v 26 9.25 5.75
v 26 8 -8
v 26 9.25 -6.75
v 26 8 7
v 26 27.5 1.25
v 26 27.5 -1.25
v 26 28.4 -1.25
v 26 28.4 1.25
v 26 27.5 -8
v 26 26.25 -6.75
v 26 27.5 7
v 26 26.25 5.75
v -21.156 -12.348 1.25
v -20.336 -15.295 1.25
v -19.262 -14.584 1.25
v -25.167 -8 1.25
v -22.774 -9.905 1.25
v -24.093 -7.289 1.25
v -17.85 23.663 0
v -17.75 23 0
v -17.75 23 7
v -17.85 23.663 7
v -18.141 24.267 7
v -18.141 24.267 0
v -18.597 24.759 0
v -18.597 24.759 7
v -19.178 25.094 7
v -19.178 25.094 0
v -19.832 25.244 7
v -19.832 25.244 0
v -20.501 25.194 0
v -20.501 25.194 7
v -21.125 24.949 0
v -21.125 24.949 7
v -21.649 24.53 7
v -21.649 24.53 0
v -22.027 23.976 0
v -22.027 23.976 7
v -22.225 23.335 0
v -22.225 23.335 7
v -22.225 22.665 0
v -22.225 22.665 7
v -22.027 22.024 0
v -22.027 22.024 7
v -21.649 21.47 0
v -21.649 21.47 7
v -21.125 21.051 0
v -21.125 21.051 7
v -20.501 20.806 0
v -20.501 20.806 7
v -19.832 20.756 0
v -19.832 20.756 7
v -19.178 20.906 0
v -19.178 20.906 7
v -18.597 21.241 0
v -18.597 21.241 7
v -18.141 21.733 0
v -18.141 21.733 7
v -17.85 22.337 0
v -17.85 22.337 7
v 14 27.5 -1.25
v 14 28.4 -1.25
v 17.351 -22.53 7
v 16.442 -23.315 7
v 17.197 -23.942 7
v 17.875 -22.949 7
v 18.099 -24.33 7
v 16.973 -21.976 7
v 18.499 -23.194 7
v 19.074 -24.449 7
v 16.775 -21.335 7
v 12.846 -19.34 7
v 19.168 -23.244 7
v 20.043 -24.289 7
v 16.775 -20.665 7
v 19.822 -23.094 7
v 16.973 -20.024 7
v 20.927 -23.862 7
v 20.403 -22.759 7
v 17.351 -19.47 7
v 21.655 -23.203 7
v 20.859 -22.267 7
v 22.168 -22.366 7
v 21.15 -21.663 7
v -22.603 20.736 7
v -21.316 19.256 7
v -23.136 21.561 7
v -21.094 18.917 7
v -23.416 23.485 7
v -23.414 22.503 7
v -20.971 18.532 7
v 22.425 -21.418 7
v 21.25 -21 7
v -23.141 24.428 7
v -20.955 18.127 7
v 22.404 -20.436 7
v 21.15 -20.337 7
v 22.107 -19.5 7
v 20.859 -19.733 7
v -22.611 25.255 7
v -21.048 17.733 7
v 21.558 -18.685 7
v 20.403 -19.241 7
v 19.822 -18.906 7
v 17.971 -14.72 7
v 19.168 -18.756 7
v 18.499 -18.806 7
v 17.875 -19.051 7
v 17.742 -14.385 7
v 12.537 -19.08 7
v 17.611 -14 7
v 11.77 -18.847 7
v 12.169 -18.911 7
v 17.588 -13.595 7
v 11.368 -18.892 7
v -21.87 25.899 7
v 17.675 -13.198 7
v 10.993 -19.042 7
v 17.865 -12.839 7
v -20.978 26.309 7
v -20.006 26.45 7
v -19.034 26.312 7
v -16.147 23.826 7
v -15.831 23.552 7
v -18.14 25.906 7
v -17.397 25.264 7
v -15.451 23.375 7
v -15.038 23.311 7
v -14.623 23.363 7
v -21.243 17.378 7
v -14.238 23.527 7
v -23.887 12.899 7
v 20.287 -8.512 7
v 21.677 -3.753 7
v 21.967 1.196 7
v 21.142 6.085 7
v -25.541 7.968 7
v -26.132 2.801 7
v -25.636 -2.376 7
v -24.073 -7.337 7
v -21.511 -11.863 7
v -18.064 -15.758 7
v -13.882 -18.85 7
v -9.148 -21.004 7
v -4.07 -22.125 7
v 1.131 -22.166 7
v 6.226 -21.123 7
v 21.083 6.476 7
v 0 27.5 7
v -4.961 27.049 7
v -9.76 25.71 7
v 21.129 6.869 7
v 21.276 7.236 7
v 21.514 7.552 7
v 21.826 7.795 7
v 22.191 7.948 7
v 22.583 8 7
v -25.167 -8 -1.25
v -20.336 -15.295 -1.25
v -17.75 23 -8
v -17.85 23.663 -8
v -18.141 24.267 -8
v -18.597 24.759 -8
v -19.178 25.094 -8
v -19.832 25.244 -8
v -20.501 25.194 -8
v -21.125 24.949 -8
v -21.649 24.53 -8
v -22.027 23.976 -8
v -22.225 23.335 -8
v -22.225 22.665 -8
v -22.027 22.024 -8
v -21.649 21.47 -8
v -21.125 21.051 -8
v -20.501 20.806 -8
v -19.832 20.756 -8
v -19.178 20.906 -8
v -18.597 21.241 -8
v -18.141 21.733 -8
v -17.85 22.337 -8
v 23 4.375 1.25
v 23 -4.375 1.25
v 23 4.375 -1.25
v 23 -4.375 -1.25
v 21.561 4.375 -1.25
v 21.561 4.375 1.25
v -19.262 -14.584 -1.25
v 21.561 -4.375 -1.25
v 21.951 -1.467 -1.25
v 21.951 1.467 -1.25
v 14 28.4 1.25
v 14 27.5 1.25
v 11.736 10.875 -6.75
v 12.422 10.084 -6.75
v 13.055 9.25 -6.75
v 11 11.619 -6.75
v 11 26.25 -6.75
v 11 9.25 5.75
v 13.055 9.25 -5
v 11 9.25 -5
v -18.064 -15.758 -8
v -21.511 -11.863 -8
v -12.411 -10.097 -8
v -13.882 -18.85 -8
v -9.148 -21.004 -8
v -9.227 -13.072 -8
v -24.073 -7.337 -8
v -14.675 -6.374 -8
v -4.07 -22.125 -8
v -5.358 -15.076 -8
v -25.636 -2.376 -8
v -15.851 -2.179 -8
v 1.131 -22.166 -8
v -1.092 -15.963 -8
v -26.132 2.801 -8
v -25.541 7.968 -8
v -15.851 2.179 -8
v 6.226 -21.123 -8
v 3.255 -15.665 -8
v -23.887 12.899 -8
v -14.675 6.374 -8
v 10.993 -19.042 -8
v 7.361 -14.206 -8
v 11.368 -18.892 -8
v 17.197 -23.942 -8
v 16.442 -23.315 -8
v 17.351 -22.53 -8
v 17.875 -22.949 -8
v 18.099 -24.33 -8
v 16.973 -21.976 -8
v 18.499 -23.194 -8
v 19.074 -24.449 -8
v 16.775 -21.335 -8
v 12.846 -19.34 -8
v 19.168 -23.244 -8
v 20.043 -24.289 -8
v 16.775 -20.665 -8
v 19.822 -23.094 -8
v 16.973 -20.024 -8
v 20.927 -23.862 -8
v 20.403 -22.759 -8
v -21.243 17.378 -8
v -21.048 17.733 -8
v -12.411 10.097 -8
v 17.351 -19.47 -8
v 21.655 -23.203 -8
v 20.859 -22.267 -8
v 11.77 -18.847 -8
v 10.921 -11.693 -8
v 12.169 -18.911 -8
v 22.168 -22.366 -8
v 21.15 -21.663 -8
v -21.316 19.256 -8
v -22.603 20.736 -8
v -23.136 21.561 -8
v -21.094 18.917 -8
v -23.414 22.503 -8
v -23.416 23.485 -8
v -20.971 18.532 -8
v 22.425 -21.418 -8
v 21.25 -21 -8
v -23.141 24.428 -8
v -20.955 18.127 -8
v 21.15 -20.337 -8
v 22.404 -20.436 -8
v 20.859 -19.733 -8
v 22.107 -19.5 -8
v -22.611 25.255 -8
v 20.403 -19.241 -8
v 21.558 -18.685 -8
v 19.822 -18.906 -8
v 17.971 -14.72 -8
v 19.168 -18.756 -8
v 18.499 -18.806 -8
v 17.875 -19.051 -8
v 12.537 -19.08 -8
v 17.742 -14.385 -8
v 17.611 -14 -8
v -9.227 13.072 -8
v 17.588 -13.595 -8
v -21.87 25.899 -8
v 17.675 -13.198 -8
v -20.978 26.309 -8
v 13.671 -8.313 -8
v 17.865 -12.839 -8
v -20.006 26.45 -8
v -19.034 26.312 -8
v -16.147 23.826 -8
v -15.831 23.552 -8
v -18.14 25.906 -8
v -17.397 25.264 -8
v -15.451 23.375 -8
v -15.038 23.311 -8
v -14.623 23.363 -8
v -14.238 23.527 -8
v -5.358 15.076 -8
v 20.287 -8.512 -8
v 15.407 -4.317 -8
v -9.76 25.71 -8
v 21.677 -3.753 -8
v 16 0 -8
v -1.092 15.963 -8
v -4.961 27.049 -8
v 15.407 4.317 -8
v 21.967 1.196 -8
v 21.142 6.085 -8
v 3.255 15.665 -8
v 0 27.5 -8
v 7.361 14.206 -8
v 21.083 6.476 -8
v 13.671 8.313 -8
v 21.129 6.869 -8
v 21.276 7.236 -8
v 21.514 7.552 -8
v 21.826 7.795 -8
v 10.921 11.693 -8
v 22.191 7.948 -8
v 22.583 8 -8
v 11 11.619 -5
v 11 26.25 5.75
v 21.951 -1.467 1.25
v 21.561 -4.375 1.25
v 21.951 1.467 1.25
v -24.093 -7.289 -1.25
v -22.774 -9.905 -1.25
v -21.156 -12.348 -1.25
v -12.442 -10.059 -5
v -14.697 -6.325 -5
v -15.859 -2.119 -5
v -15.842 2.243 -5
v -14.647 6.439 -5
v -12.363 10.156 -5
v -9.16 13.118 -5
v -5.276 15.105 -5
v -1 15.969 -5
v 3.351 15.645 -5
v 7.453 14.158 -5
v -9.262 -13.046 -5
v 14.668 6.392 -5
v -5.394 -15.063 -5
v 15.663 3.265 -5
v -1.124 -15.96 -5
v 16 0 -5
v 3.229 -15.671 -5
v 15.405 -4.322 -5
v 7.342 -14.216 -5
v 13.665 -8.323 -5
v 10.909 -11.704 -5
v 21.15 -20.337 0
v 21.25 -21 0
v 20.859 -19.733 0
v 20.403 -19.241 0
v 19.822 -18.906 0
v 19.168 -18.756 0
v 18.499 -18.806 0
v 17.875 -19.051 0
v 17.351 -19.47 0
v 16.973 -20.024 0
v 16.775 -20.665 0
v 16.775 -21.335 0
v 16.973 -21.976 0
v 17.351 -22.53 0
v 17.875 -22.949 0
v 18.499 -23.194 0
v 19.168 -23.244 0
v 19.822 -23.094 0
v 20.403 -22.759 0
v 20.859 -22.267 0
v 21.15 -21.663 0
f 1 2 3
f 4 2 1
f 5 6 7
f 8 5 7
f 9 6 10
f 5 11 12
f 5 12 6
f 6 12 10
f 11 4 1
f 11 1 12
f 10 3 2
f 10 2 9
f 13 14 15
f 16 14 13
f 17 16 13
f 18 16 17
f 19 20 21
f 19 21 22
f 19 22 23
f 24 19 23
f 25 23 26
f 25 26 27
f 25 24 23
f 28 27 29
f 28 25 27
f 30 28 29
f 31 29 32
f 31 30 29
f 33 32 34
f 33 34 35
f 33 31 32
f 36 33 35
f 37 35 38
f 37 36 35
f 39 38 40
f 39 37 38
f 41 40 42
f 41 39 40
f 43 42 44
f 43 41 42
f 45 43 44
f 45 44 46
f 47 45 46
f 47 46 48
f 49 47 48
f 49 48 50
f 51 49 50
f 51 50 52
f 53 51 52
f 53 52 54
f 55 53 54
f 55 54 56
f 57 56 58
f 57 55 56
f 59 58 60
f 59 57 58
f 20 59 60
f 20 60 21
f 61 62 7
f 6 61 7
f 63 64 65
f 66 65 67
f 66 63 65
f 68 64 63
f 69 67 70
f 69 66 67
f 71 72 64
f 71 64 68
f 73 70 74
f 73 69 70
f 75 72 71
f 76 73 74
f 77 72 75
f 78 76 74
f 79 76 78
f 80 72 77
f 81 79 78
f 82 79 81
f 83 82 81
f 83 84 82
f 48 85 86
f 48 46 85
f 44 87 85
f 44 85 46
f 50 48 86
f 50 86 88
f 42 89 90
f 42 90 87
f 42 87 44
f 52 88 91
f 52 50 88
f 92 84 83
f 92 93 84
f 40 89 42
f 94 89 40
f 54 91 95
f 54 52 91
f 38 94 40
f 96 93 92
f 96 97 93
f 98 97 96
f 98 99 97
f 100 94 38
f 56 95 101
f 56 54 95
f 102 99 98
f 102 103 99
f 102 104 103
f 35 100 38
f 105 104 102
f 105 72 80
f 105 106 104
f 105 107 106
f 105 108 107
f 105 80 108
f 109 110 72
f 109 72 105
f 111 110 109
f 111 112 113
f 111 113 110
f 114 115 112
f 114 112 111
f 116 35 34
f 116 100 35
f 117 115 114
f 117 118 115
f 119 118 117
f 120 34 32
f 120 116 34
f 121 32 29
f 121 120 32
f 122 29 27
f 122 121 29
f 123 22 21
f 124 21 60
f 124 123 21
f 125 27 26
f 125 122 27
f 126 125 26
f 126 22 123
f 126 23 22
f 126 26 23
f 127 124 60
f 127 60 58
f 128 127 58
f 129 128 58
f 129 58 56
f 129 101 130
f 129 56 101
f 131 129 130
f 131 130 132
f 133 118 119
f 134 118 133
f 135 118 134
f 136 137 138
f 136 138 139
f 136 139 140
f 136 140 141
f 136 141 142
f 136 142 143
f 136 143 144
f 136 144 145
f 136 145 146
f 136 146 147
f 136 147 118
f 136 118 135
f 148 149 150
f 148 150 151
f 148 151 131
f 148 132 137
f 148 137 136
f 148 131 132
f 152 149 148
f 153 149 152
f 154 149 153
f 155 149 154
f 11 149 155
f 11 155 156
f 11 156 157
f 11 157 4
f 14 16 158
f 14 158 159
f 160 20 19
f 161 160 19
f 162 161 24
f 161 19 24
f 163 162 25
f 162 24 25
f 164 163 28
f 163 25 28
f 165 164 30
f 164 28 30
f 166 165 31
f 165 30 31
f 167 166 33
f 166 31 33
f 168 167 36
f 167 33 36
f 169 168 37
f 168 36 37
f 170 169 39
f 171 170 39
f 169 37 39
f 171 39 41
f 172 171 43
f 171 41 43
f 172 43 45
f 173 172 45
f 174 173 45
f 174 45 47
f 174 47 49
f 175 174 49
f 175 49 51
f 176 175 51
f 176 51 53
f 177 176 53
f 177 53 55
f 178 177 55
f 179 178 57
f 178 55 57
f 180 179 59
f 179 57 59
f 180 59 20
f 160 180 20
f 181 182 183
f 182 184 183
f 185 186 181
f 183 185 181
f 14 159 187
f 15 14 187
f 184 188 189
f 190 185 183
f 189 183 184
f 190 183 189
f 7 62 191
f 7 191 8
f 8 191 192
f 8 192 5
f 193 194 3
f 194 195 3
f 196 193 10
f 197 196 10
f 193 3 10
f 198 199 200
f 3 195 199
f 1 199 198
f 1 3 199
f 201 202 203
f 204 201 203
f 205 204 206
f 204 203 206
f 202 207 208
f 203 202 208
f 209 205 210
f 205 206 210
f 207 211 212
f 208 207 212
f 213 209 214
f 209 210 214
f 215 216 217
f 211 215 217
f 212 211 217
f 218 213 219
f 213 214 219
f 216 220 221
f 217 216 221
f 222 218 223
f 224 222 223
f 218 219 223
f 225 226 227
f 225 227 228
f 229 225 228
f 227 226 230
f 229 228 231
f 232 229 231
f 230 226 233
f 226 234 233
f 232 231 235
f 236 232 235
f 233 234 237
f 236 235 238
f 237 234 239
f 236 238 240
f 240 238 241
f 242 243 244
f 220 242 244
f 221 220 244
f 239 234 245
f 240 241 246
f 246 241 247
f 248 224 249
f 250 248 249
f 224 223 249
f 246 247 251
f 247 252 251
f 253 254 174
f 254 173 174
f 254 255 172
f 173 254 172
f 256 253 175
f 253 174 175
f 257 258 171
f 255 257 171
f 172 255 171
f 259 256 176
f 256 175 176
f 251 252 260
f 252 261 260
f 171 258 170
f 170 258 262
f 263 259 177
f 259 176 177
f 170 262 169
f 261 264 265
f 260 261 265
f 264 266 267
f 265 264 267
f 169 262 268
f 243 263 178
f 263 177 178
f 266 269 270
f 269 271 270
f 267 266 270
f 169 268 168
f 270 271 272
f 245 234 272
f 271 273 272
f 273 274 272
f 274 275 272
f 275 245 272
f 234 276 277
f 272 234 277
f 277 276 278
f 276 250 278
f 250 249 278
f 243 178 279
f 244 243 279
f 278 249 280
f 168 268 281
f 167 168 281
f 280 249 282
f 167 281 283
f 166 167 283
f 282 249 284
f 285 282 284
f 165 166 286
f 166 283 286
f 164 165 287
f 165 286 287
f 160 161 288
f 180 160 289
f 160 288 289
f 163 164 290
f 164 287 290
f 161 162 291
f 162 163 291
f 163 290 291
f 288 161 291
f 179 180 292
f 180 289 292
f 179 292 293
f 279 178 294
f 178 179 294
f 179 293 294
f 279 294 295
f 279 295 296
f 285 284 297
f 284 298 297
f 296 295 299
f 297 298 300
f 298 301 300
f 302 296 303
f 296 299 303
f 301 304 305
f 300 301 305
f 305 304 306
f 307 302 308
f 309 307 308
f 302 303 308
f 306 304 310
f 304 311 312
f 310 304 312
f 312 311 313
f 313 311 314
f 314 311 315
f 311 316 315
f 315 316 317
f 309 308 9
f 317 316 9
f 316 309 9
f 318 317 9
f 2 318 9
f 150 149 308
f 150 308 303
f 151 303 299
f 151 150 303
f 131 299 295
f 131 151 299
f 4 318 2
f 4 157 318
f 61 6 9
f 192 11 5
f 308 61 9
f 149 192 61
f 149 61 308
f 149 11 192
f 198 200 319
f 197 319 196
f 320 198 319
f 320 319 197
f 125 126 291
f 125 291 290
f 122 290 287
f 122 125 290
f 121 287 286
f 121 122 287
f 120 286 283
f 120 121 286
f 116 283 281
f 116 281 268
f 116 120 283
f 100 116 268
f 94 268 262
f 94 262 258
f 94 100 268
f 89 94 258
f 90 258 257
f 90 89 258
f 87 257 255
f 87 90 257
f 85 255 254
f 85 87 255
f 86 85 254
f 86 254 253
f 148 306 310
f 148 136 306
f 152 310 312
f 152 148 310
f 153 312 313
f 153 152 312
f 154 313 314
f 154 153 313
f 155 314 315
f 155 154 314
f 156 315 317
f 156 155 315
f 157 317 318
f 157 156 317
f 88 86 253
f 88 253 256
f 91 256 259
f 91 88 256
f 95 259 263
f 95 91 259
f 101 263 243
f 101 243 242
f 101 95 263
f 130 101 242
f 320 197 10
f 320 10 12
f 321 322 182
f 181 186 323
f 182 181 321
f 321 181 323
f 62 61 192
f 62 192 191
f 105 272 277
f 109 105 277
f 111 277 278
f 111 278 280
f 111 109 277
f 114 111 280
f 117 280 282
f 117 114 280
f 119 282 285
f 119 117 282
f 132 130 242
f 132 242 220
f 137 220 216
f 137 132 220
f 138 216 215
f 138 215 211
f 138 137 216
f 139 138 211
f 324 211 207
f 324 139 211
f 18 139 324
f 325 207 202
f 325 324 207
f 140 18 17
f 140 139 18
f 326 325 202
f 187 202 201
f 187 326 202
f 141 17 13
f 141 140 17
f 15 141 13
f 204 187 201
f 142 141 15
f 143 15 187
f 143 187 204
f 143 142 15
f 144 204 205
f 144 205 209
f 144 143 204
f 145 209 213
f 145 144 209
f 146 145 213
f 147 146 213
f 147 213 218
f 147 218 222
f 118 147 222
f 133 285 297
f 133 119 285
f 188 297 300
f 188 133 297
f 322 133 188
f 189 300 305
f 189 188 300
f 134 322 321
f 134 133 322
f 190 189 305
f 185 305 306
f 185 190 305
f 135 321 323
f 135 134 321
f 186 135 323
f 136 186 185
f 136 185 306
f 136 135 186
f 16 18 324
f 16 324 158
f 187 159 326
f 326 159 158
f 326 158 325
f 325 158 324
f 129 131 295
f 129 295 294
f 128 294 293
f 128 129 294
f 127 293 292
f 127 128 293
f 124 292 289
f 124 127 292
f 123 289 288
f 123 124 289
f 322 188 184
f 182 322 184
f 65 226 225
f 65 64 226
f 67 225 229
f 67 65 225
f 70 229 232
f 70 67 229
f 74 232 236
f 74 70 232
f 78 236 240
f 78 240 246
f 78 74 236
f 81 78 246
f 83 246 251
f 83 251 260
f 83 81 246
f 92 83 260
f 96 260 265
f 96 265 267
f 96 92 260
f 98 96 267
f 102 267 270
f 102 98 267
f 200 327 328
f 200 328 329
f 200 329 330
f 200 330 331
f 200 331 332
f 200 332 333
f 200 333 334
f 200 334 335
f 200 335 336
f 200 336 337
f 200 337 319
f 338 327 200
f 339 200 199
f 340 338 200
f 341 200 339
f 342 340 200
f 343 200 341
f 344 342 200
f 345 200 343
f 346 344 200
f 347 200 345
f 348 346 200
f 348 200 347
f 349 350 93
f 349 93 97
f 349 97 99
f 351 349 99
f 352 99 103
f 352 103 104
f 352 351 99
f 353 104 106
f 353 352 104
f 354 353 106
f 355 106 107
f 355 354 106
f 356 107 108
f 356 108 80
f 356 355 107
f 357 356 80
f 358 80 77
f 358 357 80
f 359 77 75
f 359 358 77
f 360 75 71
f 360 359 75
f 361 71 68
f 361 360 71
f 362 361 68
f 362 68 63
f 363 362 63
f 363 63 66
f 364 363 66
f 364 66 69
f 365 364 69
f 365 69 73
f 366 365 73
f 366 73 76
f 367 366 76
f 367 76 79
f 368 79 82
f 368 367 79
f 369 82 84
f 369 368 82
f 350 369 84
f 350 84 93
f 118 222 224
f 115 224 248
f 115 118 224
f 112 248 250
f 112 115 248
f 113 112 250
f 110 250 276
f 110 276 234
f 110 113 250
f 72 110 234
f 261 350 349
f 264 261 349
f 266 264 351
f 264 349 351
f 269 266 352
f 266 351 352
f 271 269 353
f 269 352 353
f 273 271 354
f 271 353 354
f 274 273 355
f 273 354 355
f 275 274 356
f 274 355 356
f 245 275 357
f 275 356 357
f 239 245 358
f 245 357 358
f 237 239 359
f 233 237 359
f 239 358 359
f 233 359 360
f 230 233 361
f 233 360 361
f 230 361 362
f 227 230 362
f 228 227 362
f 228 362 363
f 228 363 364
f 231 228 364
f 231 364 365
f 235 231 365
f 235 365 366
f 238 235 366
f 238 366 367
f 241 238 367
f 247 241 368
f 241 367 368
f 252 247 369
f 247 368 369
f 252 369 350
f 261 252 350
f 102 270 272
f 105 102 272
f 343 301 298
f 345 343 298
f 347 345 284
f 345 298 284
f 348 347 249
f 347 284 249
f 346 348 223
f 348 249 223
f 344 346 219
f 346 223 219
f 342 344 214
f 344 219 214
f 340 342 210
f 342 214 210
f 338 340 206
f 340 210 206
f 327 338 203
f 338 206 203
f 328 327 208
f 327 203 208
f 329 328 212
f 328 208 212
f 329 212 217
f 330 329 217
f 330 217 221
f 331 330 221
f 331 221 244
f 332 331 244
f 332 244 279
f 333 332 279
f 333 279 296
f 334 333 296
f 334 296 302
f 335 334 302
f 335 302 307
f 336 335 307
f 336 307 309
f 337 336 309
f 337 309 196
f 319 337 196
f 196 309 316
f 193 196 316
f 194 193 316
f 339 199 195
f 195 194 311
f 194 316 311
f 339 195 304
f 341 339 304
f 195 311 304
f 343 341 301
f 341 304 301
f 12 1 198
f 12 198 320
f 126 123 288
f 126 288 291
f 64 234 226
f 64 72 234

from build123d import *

# Parameters (mm, degrees)
F0_R          = 2.25
F1_DEPTH      = 7
F1_DEPTH_BACK = 8
F2_R          = 16
F3_DEPTH      = 3
F4_W          = 12
F4_H          = 2.605645
F4_W_2        = 2.164235
F4_H_2        = 8.75
F5_DEPTH      = 1.25
F6_W          = 17
F6_H          = 12.5
F7_DEPTH      = 15


with BuildPart() as f1:
    # F0 (on Top) → F1 (new body, two sides)
    with BuildSketch(Plane.XY) as f1_sk:
        with BuildLine():
            Line((26, 8), (26, 27.5))
            Line((26, 27.5), (0, 27.5))
            ThreePointArc((0, 27.5), (-7.390942, 26.488186), (-14.23801, 23.527198))
            ThreePointArc((-14.23801, 23.527198), (-15.246821, 23.32858), (-16.146537, 23.826232))
            Line((-16.146537, 23.826232), (-17.396611, 25.263817))
            ThreePointArc((-17.396611, 25.263817), (-22.263817, 25.603389), (-22.603389, 20.736183))
            Line((-22.603389, 20.736183), (-21.316096, 19.255796))
            ThreePointArc((-21.316096, 19.255796), (-20.949135, 18.329769), (-21.243133, 17.378059))
            ThreePointArc((-21.243133, 17.378059), (-19.890092, -13.900871), (10.993048, -19.042257))
            ThreePointArc((10.993048, -19.042257), (11.971845, -18.865751), (12.845895, -19.340339))
            Line((12.845895, -19.340339), (16.441702, -23.314651))
            ThreePointArc((16.441702, -23.314651), (21.314651, -23.558298), (21.558298, -18.685349))
            Line((21.558298, -18.685349), (17.971026, -14.720469))
            ThreePointArc((17.971026, -14.720469), (17.585694, -13.798288), (17.865245, -12.838731))
            ThreePointArc((17.865245, -12.838731), (21.677485, -3.753219), (21.1417, 6.085106))
            ThreePointArc((21.1417, 6.085106), (21.384776, 7.402125), (22.58318, 8))
            Line((22.58318, 8), (26, 8))
        make_face()
        with Locations((19, -21)):
            Circle(F0_R, mode=Mode.SUBTRACT)
        with Locations((-20, 23)):
            Circle(F0_R, mode=Mode.SUBTRACT)
    extrude(amount=F1_DEPTH)
    extrude(f1_sk.sketch, amount=-F1_DEPTH_BACK)

    # F2 (on face) → F3 (cut)
    with BuildSketch(Plane(origin=(0, 0, -8), x_dir=(1, 0, 0), z_dir=(0, 0, -1))):
        Circle(F2_R)
    extrude(amount=-F3_DEPTH, mode=Mode.SUBTRACT)

    # F4 (on Top) → F5 (join, symmetric)
    with BuildSketch(Plane.XY):
        with Locations((20, 27.097178)):
            Rectangle(F4_W, F4_H)
        with Locations((21.917882, 0)):
            Rectangle(F4_W_2, F4_H_2)
        Polygon((-22.531997, -6.254788), (-25.167336, -8), (-20.336118, -15.29533), (-17.700779, -13.550117), align=None)
    extrude(amount=F5_DEPTH, both=True)

    # F6 (on face) → F7 (cut)
    with BuildSketch(Plane.YZ.offset(26)):
        with Locations((17.75, -0.5)):
            Rectangle(F6_W, F6_H)
    extrude(amount=-F7_DEPTH, mode=Mode.SUBTRACT)


solid = f1.part
